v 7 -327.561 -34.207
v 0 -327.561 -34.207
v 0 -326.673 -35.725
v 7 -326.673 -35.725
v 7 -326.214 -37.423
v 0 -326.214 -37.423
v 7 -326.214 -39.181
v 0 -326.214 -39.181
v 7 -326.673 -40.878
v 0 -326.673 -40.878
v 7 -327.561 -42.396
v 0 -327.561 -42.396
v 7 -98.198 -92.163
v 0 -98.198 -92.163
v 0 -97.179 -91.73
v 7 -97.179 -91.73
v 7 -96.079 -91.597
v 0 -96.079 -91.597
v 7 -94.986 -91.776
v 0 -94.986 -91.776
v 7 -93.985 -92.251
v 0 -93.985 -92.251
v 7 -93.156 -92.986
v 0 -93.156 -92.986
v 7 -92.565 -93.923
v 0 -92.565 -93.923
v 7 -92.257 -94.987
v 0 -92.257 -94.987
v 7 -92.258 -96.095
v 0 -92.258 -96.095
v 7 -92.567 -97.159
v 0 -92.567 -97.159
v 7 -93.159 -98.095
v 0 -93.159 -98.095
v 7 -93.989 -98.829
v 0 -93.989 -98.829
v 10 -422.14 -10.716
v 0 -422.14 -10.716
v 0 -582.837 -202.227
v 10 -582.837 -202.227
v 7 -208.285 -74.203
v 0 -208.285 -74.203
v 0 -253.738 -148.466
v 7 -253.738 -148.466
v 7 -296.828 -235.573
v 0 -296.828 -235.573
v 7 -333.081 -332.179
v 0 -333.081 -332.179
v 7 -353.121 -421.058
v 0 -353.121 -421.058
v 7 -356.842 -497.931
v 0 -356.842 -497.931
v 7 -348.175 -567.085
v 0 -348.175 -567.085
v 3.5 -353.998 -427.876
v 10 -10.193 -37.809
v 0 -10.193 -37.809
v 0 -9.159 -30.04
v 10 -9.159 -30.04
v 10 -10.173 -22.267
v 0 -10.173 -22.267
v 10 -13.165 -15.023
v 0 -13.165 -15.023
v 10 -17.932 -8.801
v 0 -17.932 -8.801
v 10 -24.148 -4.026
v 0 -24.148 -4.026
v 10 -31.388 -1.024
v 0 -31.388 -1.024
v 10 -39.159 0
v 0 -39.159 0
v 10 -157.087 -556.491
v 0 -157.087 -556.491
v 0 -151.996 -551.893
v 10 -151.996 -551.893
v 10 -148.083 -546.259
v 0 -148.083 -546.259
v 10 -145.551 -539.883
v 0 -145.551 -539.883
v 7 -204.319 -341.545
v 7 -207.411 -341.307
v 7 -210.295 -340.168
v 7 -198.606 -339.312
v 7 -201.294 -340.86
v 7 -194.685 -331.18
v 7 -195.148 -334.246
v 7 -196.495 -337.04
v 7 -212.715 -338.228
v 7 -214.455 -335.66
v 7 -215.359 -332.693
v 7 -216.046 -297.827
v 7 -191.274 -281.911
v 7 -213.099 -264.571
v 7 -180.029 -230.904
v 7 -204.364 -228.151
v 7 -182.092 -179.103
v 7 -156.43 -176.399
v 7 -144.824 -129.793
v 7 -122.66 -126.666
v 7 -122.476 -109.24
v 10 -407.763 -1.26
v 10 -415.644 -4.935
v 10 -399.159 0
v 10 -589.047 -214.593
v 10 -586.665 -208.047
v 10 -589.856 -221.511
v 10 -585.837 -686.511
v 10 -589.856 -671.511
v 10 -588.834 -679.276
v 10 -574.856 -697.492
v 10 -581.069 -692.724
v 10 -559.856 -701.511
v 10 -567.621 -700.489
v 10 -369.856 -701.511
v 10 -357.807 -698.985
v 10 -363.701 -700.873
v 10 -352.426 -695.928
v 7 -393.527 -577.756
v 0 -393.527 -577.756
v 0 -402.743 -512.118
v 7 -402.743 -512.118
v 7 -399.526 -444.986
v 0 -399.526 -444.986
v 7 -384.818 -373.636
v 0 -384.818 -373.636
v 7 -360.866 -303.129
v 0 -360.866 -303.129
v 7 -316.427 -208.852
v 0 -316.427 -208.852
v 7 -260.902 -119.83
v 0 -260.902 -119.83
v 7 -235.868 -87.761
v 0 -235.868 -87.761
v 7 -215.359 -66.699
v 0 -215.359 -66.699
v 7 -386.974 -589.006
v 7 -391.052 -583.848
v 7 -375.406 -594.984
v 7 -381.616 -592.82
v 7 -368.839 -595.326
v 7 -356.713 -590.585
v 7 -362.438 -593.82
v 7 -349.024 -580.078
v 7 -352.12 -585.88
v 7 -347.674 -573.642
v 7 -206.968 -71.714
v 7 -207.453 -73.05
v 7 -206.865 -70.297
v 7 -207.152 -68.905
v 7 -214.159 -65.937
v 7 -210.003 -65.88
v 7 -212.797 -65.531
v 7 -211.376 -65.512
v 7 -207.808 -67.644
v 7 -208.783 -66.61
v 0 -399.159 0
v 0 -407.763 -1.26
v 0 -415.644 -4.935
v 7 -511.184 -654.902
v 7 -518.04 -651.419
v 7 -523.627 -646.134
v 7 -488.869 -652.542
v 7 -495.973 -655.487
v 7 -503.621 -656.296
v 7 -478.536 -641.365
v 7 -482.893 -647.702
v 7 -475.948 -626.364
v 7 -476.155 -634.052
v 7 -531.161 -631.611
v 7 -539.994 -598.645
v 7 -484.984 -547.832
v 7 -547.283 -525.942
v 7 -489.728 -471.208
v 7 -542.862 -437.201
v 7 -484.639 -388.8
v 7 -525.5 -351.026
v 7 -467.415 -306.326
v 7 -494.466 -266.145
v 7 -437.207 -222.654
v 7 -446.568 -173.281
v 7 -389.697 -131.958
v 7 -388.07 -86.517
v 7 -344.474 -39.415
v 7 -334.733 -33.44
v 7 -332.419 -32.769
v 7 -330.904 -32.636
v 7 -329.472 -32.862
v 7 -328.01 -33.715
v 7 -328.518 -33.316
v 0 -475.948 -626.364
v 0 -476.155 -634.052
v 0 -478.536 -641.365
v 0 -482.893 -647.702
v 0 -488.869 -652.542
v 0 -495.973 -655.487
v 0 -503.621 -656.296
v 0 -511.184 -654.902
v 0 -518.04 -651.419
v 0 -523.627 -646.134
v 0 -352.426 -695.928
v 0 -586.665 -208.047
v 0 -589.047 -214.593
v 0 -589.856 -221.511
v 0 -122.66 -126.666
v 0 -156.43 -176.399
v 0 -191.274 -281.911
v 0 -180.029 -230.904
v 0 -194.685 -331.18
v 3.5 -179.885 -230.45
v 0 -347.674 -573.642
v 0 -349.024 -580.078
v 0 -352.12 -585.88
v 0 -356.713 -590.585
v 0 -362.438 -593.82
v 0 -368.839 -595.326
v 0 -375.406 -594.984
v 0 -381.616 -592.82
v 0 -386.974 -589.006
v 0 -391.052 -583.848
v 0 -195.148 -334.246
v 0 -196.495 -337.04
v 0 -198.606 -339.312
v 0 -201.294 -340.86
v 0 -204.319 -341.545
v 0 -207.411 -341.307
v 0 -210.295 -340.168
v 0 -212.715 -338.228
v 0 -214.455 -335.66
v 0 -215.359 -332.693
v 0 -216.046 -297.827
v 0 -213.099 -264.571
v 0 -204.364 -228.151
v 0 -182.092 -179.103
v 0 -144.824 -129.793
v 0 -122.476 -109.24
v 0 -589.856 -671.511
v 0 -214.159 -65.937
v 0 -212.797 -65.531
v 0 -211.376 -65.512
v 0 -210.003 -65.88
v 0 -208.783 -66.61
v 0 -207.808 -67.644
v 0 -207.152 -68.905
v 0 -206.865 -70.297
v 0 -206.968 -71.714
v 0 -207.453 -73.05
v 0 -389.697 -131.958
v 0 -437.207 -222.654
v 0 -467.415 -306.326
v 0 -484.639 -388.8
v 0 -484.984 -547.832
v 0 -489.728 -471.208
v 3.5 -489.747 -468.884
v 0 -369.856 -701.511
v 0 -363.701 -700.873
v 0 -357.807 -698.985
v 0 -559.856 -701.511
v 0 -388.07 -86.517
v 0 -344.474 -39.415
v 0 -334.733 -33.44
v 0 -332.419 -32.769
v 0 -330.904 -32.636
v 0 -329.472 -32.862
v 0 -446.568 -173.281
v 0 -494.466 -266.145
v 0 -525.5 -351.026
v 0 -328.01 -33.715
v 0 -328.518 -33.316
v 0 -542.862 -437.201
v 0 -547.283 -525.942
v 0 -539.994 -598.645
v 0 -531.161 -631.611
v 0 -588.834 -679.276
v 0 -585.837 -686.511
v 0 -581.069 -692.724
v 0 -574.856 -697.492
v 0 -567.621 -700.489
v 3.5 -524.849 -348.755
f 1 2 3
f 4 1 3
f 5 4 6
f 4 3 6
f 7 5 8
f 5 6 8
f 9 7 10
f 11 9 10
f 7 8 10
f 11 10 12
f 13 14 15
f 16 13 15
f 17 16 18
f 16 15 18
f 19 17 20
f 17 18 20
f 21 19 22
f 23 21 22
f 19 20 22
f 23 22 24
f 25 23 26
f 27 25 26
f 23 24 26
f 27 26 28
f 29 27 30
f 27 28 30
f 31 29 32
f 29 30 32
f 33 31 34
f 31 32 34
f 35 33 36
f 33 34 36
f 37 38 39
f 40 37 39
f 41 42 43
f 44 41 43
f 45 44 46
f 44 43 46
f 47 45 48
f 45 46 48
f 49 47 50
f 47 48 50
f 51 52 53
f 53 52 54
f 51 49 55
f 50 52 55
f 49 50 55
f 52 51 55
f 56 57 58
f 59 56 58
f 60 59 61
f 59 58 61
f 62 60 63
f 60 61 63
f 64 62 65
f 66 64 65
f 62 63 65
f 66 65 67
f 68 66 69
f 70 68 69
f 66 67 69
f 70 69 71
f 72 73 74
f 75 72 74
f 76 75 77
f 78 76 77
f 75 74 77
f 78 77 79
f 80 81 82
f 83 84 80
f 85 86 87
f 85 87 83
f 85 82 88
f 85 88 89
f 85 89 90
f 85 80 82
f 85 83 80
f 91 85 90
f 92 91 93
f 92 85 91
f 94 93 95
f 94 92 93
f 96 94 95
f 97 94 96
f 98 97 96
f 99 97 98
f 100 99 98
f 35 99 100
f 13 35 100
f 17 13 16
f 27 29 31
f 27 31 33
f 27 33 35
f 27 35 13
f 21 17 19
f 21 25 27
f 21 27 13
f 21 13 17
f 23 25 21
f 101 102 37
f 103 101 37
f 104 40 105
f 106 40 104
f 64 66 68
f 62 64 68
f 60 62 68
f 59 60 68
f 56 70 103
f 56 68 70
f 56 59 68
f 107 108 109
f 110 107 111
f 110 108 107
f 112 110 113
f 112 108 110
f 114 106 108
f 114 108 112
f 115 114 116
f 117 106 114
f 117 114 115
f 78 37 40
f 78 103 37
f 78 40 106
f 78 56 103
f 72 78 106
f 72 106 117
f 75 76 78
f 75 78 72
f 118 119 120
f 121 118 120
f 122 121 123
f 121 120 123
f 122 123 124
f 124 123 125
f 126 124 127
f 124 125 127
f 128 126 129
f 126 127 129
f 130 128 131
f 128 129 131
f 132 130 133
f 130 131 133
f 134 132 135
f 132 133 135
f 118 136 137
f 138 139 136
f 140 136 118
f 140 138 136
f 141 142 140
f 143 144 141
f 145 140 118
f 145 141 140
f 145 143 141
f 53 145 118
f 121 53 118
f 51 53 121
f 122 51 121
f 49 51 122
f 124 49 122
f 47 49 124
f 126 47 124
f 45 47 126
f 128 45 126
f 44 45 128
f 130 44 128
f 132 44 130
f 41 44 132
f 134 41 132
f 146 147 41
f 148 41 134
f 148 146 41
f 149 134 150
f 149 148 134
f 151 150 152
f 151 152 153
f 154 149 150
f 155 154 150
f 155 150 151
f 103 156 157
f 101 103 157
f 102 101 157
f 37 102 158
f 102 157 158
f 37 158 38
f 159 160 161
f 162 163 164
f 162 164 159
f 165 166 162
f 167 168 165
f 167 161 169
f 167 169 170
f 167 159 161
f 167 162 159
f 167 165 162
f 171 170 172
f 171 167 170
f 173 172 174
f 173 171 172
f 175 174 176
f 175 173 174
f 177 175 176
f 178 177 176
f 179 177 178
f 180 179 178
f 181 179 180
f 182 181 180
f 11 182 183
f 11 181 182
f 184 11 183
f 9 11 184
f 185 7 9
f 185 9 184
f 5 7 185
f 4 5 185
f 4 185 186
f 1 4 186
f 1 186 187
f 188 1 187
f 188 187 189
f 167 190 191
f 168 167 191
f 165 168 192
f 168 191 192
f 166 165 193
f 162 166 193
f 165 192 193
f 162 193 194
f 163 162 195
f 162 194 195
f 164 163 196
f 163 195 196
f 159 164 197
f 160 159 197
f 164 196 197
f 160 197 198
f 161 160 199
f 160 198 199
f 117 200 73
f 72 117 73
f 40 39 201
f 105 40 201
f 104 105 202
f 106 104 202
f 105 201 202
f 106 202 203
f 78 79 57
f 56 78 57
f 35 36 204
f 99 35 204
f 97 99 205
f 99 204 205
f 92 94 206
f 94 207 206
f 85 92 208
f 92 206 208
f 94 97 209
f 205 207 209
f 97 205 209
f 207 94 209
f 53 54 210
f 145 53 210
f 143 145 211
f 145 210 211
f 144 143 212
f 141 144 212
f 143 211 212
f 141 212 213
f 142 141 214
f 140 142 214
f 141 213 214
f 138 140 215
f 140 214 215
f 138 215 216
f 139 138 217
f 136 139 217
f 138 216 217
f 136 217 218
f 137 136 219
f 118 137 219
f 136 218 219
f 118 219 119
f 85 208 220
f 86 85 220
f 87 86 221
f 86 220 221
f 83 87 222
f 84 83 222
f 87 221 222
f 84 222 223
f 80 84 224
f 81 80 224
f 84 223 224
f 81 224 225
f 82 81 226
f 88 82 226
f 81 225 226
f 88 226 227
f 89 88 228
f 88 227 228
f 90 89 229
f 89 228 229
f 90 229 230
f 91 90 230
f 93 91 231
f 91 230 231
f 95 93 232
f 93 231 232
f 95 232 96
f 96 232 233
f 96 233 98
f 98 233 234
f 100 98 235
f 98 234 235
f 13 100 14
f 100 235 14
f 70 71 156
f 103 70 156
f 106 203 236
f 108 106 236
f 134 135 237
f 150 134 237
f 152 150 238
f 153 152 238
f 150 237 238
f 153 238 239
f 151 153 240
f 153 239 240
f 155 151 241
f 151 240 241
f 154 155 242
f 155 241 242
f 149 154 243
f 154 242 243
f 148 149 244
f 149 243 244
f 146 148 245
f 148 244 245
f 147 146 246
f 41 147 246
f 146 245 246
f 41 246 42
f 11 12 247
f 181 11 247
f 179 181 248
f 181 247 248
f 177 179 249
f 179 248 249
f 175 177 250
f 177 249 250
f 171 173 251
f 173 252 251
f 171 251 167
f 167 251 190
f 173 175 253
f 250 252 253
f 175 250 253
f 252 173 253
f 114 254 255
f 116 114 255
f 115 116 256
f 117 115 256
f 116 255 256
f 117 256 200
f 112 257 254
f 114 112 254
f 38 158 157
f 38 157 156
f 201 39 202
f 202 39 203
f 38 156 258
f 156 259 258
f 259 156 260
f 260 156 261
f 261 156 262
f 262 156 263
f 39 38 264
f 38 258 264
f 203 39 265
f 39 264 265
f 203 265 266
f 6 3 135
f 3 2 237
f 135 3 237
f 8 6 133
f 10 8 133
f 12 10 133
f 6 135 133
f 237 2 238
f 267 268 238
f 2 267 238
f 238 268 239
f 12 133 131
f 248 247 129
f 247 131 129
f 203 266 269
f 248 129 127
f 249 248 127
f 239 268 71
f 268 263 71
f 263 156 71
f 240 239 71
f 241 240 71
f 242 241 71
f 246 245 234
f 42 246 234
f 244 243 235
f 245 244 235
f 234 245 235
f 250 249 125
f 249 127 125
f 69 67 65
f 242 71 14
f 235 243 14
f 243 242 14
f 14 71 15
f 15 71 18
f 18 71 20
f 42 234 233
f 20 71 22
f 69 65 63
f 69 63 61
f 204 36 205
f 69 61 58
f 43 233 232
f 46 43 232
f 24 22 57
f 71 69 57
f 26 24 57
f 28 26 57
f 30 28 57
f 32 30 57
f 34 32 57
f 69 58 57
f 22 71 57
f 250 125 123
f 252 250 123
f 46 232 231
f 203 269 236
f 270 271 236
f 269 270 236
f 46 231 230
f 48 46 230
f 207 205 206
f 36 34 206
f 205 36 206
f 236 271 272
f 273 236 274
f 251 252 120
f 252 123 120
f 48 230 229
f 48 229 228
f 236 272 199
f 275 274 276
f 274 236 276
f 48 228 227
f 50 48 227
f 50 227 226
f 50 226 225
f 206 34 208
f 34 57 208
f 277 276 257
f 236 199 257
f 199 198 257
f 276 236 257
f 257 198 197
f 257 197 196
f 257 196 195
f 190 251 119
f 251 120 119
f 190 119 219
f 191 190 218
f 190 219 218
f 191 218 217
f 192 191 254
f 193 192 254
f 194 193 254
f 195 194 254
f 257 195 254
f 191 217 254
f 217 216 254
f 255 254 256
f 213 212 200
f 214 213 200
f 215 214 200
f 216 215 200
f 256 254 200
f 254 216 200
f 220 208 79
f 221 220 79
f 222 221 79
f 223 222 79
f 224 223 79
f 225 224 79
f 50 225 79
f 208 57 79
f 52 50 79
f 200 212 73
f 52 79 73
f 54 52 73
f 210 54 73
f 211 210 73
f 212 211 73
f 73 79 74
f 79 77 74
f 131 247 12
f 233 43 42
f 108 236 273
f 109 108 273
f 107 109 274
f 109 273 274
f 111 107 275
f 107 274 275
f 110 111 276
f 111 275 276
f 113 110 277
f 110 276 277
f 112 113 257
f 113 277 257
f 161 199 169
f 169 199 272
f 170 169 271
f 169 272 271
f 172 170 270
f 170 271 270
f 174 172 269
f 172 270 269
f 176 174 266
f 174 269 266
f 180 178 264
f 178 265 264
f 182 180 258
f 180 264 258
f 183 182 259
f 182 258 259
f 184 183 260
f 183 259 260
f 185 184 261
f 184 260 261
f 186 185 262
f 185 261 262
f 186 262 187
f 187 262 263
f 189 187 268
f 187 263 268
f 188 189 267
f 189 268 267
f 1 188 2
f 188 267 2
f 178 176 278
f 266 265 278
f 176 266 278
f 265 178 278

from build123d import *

# Parameters (mm, degrees)
BOSS_EXTRUDE1_DEPTH = 10
CUT_EXTRUDE3_DEPTH  = 7


with BuildPart() as part:
    # Sketch1 → Boss-Extrude1 (new body)
    with BuildSketch(Plane(origin=(0, 0, 0), x_dir=(0, 0, -1), z_dir=(1, 0, 0))):
        with BuildLine():
            Line((0, -39.159060238), (0, -399.159060238))
            ThreePointArc((0, -399.159060238), (2.810766389, -411.83760809), (10.716371709, -422.140393531))
            Line((10.716371709, -422.140393531), (202.227482489, -582.837295953))
            ThreePointArc((202.227482489, -582.837295953), (211.25050648, -588.046741283), (221.51111078, -589.855962659))
            Line((221.51111078, -589.855962659), (671.51111078, -589.855962659))
            ThreePointArc((671.51111078, -589.855962659), (692.724314215, -581.069166095), (701.51111078, -559.855962659))
            Line((701.51111078, -559.855962659), (701.51111078, -369.855962659))
            ThreePointArc((701.51111078, -369.855962659), (700.081380744, -360.705024227), (695.928465834, -352.426310564))
            Line((695.928465834, -352.426310564), (556.491249073, -157.087470131))
            ThreePointArc((556.491249073, -157.087470131), (549.188422732, -149.877866821), (539.883012979, -145.551320648))
            Line((539.883012979, -145.551320648), (37.809118961, -10.19325866))
            ThreePointArc((37.809118961, -10.19325866), (11.755460664, -15.344426409), (0, -39.159060238))
        make_face()
    extrude(amount=BOSS_EXTRUDE1_DEPTH)

    # Sketch5 → Cut-Extrude3 (cut)
    with BuildSketch(Plane.ZY):
        with BuildLine():
            ThreePointArc((-331.179728441, -194.685467652), (-341.545058852, -204.318697463), (-332.693478174, -215.359019498))
            add(Edge.make_bspline(
                [(-332.693478174, -215.359019498), (-331.921739283, -215.472572374), (-226.918714052, -224.562098265), (-126.325036043, -154.802617957), (-92.163413905, -98.198220596)],
                knots=[0, 0, 0, 0, 0.354260741, 1, 1, 1, 1], degree=3))
            ThreePointArc((-92.163413905, -98.198220596), (-93.433821546, -92.827514339), (-98.829146805, -93.988930122))
            add(Edge.make_bspline(
                [(-98.829146805, -93.988930122), (-112.622758483, -114.88285895), (-192.730208888, -182.13783781), (-300.184384568, -194.688304583), (-331.179728441, -194.685467652)],
                knots=[0, 0, 0, 0, 0.660882752, 1, 1, 1, 1], degree=3))
        make_face()
        with BuildLine():
            ThreePointArc((-626.364411935, -475.947865394), (-654.270375926, -492.315038086), (-646.133694128, -523.626722446))
            add(Edge.make_bspline(
                [(-646.133694128, -523.626722446), (-620.265200397, -544.090123727), (-324.808789115, -589.015611509), (-14.475713482, -342.918185901), (-34.207392898, -327.560917886)],
                knots=[0, 0, 0, 0, 0.454280693, 1, 1, 1, 1], degree=3))
            ThreePointArc((-34.207392898, -327.560917886), (-38.301805286, -326.1553415), (-42.396217675, -327.560917886))
            add(Edge.make_bspline(
                [(-42.396217675, -327.560917886), (-179.998241324, -434.657283692), (-369.496171973, -510.067463814), (-572.427382245, -482.279425386), (-626.364411935, -475.947865394)],
                knots=[0, 0, 0, 0, 0.742688993, 1, 1, 1, 1], degree=3))
        make_face()
        with BuildLine():
            ThreePointArc((-567.085033992, -348.175125638), (-594.800287265, -365.58541059), (-577.755509271, -393.526935767))
            add(Edge.make_bspline(
                [(-577.755509271, -393.526935767), (-509.639726303, -410.500517765), (-300.322217315, -390.035120939), (-100.320017518, -254.957400328), (-66.698936736, -215.359019498)],
                knots=[0, 0, 0, 0, 0.345289595, 1, 1, 1, 1], degree=3))
            ThreePointArc((-66.698936736, -215.359019498), (-67.092959072, -208.260098077), (-74.202765192, -208.284508838))
            add(Edge.make_bspline(
                [(-74.202765192, -208.284508838), (-81.149231878, -214.924232147), (-316.076431581, -369.790908175), (-526.742508558, -357.109499901), (-567.085033992, -348.175125638)],
                knots=[0, 0, 0, 0, 0.768435057, 1, 1, 1, 1], degree=3))
        make_face()
    extrude(amount=-CUT_EXTRUDE3_DEPTH, mode=Mode.SUBTRACT)


solid = part.part
